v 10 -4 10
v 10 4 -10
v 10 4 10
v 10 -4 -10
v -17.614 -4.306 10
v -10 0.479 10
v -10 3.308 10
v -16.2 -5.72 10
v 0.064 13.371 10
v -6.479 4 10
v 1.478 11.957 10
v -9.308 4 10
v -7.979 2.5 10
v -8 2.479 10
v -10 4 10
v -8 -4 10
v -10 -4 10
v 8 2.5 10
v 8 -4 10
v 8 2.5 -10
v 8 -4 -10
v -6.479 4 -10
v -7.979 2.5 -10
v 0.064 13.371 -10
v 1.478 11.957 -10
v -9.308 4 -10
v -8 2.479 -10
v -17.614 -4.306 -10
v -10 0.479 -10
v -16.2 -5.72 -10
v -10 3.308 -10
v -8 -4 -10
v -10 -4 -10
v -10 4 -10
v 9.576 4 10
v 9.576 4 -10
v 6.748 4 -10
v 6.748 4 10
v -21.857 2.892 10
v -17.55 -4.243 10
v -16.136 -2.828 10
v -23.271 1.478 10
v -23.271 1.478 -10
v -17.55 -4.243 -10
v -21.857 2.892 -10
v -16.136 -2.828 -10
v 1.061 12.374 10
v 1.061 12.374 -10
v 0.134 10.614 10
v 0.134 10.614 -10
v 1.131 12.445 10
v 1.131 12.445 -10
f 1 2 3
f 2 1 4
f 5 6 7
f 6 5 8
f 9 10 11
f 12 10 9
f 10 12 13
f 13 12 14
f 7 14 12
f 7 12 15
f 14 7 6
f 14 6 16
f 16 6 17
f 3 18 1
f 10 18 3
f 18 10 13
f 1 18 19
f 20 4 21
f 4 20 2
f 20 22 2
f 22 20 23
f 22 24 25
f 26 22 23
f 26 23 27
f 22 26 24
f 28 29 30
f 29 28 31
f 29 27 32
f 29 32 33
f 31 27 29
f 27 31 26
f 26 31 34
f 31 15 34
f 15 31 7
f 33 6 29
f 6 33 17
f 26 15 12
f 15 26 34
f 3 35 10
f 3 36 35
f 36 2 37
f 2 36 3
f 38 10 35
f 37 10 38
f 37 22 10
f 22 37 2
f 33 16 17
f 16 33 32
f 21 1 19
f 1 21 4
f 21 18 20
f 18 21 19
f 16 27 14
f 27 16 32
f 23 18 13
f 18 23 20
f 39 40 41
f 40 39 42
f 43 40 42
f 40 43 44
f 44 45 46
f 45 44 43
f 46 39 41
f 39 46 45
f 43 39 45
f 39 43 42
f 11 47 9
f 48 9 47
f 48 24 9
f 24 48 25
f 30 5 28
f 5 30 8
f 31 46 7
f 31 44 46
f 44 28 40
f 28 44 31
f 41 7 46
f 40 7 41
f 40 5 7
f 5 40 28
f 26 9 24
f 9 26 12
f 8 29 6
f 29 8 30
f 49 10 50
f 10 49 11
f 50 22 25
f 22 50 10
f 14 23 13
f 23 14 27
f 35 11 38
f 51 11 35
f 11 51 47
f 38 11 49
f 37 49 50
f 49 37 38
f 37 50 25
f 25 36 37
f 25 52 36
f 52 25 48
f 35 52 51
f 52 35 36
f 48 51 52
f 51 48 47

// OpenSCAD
    union() {
        union() {
            difference(){
                color("blue") cube ([20, 8, 20], center=true);
                color("red") translate ([0, -1, 0]) cube ([16, 7, 200], center=true);
            }
        }

        color("yellow")
            rotate(a=135)
                translate([7.5, 13.41, -10]) difference() {
                    cube ([10, 2, 20]);
                }

        color("pink")
            rotate(a=45)
                translate([-15.5, 7.41, -10]) difference() {
                    cube ([25, 2, 20]);
                }

        color("orange") 
            rotate(a=135) 
                translate([-4, -9.6, -10]) 
                    cube ([12, 2, 20]);
    }
